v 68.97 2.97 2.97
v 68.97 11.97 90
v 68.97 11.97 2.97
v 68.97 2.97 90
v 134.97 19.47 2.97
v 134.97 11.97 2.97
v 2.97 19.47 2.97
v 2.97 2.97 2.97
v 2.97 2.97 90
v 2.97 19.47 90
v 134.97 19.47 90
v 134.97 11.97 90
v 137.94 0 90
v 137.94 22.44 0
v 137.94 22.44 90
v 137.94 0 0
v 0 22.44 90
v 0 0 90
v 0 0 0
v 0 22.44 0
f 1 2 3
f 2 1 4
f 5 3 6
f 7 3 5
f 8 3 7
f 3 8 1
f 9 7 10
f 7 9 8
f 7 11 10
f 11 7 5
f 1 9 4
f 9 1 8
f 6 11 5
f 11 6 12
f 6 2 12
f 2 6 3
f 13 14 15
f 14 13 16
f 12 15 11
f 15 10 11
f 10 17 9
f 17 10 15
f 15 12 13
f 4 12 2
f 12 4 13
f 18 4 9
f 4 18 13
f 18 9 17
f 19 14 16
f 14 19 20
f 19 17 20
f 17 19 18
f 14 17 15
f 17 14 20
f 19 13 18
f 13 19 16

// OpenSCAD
// Fold 4
$fn = 36;

t=2.97;

width1=66;
width2=132;

//depth1=17.4; //with Camera
depth1=16.5; //without
depth2=7.5;

heightp=155;
heighth=90;

module foldWithoutCameraClosed() {
    color("#AAAAAA")
    cube([width1, depth1, heightp]);
}

module foldWithoutCameraOpened() {
    color("#888888")
    cube([width2, depth2, heightp]);
}

module bothPhones() {
    
    foldWithoutCameraClosed();
    
    translate([0,depth1-depth2,0])
    foldWithoutCameraOpened();
}

module phonesInHolder() {
    translate([t,t,t])
    bothPhones();
}

module holder() {
    difference() {
        cube([width2+t*2, depth1+t*2, heighth]);
        
        phonesInHolder();
    }
}

holder();
